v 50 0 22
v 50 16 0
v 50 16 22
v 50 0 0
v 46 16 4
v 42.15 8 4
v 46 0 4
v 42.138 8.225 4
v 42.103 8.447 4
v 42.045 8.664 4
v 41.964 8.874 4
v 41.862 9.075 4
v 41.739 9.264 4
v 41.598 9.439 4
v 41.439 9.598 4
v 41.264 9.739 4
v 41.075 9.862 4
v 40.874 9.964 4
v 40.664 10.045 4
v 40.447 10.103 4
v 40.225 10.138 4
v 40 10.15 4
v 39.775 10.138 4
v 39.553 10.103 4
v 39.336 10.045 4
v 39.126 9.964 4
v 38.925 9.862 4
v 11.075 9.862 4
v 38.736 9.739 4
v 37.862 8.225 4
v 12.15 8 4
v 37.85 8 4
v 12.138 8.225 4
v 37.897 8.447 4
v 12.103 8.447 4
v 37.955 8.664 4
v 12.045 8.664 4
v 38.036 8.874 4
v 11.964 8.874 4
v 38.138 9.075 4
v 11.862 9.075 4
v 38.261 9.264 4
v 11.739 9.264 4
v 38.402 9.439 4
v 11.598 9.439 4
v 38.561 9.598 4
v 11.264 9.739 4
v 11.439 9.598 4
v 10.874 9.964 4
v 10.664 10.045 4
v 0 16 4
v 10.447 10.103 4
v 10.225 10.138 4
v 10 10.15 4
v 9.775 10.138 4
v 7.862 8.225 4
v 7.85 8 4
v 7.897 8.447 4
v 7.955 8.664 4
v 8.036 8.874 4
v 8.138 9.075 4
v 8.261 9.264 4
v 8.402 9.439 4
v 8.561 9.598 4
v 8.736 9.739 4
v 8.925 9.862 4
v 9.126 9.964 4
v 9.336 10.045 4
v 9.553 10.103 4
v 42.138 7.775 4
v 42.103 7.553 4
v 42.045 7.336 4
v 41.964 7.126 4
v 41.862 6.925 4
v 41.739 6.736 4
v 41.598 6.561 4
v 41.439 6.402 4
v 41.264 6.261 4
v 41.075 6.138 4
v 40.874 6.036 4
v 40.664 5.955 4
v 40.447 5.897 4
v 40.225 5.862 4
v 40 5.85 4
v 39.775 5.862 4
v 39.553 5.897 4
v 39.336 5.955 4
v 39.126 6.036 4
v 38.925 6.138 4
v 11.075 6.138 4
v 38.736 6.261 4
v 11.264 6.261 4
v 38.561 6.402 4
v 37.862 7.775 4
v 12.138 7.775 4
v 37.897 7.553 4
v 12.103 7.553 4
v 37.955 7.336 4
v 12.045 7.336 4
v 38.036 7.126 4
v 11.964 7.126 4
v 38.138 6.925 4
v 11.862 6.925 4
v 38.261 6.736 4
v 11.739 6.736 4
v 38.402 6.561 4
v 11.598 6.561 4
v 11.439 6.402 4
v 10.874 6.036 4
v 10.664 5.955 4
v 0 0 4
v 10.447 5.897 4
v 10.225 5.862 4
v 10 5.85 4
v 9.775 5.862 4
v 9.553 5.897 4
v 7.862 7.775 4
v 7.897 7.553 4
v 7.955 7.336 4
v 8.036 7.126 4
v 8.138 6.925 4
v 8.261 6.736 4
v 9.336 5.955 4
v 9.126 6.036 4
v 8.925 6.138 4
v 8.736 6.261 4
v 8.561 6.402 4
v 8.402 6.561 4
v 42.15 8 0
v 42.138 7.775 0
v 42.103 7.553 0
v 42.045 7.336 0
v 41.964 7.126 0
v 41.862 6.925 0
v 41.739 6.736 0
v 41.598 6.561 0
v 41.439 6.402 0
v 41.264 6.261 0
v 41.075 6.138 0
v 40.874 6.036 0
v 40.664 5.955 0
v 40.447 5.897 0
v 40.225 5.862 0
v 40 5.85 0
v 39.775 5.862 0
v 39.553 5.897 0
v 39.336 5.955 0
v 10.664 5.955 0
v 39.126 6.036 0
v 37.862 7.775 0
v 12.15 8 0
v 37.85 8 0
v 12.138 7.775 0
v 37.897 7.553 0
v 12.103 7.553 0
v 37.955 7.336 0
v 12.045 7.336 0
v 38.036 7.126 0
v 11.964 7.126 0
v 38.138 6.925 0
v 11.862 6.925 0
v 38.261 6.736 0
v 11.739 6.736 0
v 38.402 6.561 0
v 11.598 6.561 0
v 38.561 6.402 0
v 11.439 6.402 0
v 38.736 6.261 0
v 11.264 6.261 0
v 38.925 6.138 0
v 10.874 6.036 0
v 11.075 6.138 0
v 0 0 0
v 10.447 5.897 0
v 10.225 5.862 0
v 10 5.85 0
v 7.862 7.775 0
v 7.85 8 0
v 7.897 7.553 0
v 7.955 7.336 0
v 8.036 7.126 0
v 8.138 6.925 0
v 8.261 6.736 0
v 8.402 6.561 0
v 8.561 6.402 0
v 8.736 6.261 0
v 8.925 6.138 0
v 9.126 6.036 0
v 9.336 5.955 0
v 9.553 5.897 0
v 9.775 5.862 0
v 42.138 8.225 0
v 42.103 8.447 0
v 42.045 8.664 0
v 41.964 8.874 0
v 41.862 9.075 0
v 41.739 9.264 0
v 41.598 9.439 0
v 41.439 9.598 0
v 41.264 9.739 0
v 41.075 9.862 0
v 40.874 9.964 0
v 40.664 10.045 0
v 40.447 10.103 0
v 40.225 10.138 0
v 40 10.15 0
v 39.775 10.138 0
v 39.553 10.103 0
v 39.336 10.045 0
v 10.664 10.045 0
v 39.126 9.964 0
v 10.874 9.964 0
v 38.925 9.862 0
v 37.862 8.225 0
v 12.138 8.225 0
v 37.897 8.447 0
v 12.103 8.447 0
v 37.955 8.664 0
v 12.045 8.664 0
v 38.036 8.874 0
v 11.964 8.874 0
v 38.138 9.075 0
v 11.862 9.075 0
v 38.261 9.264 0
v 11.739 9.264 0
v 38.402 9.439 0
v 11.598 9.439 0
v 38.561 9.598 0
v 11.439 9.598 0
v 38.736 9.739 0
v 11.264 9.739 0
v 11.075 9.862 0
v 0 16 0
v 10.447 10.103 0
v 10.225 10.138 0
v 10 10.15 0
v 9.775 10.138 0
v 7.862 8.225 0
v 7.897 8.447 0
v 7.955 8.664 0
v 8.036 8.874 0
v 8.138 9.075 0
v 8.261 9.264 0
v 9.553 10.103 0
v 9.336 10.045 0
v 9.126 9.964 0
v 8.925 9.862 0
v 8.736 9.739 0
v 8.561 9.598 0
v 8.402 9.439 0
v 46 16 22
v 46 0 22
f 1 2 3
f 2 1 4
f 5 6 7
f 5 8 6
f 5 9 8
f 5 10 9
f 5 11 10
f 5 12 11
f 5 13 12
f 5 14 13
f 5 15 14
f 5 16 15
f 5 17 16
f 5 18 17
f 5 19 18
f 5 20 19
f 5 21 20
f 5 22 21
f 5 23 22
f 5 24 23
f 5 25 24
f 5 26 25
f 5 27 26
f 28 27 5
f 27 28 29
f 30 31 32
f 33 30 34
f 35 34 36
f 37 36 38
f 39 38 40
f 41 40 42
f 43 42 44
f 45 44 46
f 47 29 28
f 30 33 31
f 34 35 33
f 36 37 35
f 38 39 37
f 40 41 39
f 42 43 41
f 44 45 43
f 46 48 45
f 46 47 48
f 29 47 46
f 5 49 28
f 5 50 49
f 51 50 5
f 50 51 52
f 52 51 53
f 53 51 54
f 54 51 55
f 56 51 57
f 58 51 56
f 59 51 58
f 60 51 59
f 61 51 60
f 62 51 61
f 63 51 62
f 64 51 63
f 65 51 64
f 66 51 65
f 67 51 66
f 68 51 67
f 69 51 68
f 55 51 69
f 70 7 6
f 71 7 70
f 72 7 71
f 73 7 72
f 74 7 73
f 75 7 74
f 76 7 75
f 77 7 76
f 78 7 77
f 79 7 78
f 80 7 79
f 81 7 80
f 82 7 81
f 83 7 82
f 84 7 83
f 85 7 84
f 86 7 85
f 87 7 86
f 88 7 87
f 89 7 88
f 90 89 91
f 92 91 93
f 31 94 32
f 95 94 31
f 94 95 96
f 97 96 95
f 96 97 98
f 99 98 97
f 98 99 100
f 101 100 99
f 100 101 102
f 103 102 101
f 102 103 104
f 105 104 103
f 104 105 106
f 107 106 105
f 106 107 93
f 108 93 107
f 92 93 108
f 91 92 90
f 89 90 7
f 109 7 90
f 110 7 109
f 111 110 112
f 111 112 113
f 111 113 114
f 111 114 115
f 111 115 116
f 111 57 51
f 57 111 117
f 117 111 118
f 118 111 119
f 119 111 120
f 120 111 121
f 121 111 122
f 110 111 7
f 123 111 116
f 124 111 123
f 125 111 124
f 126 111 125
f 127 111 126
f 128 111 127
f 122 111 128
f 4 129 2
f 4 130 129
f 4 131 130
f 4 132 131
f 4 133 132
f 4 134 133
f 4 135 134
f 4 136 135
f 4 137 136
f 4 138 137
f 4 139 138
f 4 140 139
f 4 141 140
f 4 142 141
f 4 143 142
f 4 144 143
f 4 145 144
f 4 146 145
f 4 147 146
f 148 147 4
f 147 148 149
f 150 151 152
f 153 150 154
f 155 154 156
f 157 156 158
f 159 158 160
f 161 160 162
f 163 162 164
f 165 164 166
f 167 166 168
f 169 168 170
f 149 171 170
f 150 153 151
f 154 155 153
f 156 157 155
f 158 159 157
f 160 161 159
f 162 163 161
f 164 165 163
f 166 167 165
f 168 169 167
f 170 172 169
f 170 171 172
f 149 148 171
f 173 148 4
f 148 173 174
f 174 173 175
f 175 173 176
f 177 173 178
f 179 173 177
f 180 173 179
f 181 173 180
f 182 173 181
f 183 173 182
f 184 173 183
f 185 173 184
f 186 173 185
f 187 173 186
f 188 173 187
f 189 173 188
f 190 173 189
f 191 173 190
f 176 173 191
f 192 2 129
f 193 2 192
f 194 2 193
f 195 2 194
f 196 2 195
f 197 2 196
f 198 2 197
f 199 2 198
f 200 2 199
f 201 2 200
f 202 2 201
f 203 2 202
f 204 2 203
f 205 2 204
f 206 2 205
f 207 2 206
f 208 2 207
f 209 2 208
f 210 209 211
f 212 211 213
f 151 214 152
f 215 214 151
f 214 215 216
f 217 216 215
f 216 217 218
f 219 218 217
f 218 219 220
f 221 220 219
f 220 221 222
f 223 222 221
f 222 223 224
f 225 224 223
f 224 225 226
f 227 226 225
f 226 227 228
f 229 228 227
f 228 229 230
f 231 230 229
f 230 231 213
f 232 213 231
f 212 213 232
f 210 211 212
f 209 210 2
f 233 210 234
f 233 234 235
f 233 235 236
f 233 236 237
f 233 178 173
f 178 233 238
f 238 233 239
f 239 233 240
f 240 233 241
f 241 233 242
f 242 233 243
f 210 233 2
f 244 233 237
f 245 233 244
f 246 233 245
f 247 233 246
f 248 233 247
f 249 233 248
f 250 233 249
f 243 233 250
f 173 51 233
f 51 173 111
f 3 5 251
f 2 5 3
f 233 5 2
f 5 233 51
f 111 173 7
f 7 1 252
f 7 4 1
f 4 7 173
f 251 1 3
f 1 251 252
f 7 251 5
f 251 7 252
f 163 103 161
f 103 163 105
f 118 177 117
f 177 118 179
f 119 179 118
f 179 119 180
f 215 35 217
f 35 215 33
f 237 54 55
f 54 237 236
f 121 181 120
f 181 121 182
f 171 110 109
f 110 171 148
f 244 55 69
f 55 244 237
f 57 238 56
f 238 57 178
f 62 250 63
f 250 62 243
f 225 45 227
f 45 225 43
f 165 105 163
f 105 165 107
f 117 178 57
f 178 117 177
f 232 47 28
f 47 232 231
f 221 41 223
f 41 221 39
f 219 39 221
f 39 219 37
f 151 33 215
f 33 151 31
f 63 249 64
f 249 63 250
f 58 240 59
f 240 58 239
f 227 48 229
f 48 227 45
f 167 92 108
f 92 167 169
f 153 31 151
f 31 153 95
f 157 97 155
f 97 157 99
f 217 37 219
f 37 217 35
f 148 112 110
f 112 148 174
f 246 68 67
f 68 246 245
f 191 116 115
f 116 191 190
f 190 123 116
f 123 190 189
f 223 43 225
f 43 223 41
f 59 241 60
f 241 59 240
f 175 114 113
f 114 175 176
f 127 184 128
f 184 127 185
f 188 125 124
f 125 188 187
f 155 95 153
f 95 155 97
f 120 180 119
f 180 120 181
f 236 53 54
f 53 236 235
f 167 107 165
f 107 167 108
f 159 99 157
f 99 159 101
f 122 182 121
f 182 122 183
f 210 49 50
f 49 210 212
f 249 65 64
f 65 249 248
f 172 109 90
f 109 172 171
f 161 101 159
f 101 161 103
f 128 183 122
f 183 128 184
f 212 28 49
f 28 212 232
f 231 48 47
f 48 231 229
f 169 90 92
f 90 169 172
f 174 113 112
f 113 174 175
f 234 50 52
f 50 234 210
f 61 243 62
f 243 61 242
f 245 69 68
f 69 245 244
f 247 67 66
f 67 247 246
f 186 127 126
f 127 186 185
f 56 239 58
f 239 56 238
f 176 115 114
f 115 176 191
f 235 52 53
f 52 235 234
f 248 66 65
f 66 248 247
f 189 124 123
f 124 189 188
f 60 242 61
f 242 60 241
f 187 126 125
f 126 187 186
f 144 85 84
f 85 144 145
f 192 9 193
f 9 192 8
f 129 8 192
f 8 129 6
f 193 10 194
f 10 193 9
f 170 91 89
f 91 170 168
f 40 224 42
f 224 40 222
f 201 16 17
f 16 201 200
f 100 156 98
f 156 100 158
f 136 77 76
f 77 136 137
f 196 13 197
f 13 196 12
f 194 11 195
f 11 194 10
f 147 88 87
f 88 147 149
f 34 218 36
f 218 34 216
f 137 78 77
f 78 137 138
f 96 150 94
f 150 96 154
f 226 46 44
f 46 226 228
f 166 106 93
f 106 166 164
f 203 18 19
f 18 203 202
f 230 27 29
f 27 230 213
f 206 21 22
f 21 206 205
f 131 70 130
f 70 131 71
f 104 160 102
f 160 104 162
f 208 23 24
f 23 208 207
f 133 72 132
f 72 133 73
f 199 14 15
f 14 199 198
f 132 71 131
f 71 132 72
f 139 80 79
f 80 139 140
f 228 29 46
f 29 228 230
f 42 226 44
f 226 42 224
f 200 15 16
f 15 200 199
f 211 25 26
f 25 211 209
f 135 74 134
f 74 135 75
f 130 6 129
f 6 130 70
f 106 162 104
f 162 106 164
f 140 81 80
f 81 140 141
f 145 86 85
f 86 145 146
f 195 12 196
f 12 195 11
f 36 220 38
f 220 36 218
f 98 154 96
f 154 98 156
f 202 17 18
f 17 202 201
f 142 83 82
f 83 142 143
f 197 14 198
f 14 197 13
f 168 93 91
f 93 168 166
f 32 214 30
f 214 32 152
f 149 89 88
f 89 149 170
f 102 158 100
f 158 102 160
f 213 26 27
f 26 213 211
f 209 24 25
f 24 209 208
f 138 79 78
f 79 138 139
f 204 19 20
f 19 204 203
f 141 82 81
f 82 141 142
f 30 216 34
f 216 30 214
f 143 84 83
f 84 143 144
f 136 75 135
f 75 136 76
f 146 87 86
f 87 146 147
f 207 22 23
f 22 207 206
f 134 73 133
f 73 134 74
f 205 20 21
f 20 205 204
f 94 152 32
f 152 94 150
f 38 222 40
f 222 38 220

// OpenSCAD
// Latch hook bracket.
$fn = 60;
eps = 0.02;
length = 50;
height = 18;
width = 16;
thickness = 4;
difference() { union() { cube([length,width,thickness]); translate([length-thickness,0,thickness]) cube([thickness,width,height]); } for(x=[10,length-10]) translate([x,width/2,-eps]) cylinder(d=4.3,h=thickness+2*eps); }
